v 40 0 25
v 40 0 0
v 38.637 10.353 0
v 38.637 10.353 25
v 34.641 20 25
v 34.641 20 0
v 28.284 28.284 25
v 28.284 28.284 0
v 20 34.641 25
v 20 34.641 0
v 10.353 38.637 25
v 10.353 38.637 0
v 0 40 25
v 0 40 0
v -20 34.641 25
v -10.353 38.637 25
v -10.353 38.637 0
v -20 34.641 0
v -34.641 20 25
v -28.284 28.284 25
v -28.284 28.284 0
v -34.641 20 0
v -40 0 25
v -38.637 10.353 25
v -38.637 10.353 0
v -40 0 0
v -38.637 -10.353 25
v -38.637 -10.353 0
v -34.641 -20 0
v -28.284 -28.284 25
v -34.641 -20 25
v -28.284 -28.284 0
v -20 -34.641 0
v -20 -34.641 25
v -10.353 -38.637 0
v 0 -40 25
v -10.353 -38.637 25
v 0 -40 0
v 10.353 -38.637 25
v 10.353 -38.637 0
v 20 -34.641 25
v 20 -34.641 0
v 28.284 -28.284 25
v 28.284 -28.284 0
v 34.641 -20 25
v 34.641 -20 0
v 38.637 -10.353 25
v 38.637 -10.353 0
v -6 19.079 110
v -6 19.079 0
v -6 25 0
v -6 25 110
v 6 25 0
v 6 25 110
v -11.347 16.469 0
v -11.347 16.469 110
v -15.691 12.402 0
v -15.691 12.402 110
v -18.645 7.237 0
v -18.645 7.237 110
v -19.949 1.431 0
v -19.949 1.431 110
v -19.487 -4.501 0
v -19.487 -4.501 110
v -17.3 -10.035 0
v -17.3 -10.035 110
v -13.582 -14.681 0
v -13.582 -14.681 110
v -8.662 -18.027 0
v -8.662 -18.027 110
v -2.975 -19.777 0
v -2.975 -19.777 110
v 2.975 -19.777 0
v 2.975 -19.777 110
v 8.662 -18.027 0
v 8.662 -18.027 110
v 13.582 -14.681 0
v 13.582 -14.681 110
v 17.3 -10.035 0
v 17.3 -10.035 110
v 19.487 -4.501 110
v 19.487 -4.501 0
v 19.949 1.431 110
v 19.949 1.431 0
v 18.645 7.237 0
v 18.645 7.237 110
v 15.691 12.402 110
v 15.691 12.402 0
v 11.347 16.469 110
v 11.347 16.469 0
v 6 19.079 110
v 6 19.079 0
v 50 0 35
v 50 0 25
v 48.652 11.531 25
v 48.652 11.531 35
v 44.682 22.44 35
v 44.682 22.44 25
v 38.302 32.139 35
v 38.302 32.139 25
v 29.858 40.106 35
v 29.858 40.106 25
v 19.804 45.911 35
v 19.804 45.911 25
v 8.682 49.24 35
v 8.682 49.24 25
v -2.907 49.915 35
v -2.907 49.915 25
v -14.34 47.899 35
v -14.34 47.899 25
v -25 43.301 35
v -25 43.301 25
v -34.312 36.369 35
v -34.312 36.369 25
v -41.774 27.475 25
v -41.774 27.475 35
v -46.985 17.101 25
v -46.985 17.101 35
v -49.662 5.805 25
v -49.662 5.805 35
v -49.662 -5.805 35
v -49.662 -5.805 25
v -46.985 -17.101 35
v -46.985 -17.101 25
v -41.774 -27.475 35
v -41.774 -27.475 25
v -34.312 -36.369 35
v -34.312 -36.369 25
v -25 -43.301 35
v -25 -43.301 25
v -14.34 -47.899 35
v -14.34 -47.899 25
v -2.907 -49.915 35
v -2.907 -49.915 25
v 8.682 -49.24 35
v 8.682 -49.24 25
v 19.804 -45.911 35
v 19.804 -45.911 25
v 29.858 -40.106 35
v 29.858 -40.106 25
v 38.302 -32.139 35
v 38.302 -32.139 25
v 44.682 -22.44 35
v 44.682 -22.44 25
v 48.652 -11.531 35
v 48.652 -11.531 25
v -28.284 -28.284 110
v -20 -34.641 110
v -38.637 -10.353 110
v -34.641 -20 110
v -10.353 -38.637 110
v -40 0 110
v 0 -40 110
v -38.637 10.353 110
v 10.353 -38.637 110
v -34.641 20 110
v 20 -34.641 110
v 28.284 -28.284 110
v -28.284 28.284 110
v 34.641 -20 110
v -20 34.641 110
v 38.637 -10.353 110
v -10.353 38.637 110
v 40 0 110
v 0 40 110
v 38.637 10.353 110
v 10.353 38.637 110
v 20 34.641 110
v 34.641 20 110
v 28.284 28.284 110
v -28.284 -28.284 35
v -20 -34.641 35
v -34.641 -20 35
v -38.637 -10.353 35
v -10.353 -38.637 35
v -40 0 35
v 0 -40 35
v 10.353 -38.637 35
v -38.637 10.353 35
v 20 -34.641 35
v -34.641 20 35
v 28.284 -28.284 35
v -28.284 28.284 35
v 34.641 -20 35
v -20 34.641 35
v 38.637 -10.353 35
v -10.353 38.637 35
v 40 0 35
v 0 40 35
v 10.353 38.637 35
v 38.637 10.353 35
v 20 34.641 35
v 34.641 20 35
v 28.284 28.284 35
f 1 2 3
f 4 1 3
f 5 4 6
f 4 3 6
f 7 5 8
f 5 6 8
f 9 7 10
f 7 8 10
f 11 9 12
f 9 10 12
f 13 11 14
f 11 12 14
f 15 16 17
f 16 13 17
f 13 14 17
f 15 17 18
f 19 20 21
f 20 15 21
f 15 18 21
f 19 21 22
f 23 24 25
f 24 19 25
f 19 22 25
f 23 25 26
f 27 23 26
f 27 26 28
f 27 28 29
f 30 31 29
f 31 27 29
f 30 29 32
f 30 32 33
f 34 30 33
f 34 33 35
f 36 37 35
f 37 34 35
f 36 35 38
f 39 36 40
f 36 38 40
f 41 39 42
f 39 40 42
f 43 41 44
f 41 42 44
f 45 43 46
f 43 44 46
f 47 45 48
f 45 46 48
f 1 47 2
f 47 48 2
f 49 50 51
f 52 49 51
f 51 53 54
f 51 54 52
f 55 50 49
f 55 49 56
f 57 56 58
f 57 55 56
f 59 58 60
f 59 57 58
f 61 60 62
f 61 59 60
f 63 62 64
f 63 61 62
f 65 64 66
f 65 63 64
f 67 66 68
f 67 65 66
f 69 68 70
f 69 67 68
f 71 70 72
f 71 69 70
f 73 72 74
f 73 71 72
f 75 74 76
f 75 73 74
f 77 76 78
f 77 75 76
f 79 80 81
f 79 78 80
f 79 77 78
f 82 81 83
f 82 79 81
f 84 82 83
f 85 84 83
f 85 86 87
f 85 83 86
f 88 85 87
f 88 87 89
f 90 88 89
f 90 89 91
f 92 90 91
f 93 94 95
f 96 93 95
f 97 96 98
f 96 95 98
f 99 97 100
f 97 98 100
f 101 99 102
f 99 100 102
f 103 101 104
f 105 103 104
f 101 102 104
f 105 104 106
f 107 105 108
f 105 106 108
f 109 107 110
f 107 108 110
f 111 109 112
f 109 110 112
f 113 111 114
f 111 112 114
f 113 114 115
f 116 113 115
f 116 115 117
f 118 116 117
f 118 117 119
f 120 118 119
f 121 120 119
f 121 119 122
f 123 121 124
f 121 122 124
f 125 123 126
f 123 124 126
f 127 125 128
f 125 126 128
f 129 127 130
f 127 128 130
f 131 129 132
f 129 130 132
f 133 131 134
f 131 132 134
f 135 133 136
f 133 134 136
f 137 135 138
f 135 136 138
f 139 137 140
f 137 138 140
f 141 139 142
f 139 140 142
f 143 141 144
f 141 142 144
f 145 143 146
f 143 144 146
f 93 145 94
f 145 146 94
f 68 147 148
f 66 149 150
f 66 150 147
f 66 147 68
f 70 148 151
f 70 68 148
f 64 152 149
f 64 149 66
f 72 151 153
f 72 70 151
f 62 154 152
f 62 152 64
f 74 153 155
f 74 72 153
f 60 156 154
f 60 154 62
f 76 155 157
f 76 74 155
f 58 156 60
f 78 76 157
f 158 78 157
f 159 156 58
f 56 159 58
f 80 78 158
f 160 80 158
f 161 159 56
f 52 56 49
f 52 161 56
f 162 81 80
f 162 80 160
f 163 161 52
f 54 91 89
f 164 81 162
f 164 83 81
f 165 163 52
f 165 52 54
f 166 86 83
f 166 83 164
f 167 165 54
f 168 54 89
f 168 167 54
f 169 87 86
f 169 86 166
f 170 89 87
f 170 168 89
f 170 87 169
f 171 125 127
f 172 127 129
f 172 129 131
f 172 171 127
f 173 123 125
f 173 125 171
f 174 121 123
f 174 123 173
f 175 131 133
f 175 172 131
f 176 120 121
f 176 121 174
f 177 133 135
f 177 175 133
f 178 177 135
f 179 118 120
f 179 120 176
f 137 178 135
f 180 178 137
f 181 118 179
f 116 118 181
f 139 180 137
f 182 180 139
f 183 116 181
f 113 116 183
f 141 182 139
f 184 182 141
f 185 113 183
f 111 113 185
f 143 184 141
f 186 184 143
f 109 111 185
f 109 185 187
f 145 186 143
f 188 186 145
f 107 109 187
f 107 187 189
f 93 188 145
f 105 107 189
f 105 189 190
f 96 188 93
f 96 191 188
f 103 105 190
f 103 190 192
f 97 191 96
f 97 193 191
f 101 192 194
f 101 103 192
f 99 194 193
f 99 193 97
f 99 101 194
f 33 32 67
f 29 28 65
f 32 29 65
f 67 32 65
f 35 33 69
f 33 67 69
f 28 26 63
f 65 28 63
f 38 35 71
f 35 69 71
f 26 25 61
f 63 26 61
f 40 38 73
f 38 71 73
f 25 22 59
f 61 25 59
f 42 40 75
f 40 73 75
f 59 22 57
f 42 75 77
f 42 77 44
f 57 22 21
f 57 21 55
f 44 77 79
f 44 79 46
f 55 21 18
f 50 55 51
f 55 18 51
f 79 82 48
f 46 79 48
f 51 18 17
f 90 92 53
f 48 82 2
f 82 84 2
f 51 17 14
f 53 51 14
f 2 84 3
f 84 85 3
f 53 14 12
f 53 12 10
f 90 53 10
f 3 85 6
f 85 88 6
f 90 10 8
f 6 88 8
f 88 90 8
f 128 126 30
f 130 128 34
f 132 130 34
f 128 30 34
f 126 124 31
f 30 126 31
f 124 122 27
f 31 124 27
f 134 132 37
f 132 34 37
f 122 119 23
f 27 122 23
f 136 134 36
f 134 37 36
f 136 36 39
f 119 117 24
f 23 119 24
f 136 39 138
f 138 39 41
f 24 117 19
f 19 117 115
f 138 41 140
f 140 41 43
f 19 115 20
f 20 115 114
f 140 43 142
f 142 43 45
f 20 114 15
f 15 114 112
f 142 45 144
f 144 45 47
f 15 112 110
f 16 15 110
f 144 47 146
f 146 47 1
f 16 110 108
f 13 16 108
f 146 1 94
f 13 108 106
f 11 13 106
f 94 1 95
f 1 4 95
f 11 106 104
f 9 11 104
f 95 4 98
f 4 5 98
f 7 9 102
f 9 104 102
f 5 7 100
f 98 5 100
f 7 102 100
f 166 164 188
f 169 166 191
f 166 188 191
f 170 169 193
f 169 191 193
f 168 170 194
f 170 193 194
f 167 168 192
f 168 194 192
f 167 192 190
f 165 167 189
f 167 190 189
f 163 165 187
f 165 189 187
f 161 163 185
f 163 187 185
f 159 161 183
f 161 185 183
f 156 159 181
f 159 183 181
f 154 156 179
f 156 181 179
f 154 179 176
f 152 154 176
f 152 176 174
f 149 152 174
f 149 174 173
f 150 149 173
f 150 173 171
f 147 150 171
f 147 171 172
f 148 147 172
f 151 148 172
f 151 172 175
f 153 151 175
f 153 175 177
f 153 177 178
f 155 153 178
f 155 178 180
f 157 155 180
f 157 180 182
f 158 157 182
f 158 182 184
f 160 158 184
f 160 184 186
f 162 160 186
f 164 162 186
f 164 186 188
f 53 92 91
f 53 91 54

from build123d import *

# Parameters (mm, degrees)
SKETCH1_R           = 40
SKETCH1_R_2         = 20
BOSS_EXTRUDE1_DEPTH = 110
SKETCH2_R           = 50
SKETCH2_R_2         = 20
BOSS_EXTRUDE2_DEPTH = 10
SKETCH3_W           = 12
SKETCH3_H           = 14.623455079
CUT_EXTRUDE1_DEPTH  = 131.766968306


with BuildPart() as part:
    # Sketch1 → Boss-Extrude1 (new body)
    with BuildSketch(Plane.XY):
        Circle(SKETCH1_R)
        Circle(SKETCH1_R_2, mode=Mode.SUBTRACT)
    extrude(amount=BOSS_EXTRUDE1_DEPTH)

    # Sketch2 → Boss-Extrude2 (add)
    with BuildSketch(Plane.XY.offset(25)):
        Circle(SKETCH2_R)
        Circle(SKETCH2_R_2, mode=Mode.SUBTRACT)
    extrude(amount=BOSS_EXTRUDE2_DEPTH)

    # Sketch3 → Cut-Extrude1 (cut, through all)
    with BuildSketch(Plane(origin=(0, 0, 0), x_dir=(-1, 0, 0), z_dir=(0, 0, -1))):
        with Locations((0, 17.688272461)):
            Rectangle(SKETCH3_W, SKETCH3_H)
    extrude(amount=-CUT_EXTRUDE1_DEPTH, mode=Mode.SUBTRACT)


solid = part.part
